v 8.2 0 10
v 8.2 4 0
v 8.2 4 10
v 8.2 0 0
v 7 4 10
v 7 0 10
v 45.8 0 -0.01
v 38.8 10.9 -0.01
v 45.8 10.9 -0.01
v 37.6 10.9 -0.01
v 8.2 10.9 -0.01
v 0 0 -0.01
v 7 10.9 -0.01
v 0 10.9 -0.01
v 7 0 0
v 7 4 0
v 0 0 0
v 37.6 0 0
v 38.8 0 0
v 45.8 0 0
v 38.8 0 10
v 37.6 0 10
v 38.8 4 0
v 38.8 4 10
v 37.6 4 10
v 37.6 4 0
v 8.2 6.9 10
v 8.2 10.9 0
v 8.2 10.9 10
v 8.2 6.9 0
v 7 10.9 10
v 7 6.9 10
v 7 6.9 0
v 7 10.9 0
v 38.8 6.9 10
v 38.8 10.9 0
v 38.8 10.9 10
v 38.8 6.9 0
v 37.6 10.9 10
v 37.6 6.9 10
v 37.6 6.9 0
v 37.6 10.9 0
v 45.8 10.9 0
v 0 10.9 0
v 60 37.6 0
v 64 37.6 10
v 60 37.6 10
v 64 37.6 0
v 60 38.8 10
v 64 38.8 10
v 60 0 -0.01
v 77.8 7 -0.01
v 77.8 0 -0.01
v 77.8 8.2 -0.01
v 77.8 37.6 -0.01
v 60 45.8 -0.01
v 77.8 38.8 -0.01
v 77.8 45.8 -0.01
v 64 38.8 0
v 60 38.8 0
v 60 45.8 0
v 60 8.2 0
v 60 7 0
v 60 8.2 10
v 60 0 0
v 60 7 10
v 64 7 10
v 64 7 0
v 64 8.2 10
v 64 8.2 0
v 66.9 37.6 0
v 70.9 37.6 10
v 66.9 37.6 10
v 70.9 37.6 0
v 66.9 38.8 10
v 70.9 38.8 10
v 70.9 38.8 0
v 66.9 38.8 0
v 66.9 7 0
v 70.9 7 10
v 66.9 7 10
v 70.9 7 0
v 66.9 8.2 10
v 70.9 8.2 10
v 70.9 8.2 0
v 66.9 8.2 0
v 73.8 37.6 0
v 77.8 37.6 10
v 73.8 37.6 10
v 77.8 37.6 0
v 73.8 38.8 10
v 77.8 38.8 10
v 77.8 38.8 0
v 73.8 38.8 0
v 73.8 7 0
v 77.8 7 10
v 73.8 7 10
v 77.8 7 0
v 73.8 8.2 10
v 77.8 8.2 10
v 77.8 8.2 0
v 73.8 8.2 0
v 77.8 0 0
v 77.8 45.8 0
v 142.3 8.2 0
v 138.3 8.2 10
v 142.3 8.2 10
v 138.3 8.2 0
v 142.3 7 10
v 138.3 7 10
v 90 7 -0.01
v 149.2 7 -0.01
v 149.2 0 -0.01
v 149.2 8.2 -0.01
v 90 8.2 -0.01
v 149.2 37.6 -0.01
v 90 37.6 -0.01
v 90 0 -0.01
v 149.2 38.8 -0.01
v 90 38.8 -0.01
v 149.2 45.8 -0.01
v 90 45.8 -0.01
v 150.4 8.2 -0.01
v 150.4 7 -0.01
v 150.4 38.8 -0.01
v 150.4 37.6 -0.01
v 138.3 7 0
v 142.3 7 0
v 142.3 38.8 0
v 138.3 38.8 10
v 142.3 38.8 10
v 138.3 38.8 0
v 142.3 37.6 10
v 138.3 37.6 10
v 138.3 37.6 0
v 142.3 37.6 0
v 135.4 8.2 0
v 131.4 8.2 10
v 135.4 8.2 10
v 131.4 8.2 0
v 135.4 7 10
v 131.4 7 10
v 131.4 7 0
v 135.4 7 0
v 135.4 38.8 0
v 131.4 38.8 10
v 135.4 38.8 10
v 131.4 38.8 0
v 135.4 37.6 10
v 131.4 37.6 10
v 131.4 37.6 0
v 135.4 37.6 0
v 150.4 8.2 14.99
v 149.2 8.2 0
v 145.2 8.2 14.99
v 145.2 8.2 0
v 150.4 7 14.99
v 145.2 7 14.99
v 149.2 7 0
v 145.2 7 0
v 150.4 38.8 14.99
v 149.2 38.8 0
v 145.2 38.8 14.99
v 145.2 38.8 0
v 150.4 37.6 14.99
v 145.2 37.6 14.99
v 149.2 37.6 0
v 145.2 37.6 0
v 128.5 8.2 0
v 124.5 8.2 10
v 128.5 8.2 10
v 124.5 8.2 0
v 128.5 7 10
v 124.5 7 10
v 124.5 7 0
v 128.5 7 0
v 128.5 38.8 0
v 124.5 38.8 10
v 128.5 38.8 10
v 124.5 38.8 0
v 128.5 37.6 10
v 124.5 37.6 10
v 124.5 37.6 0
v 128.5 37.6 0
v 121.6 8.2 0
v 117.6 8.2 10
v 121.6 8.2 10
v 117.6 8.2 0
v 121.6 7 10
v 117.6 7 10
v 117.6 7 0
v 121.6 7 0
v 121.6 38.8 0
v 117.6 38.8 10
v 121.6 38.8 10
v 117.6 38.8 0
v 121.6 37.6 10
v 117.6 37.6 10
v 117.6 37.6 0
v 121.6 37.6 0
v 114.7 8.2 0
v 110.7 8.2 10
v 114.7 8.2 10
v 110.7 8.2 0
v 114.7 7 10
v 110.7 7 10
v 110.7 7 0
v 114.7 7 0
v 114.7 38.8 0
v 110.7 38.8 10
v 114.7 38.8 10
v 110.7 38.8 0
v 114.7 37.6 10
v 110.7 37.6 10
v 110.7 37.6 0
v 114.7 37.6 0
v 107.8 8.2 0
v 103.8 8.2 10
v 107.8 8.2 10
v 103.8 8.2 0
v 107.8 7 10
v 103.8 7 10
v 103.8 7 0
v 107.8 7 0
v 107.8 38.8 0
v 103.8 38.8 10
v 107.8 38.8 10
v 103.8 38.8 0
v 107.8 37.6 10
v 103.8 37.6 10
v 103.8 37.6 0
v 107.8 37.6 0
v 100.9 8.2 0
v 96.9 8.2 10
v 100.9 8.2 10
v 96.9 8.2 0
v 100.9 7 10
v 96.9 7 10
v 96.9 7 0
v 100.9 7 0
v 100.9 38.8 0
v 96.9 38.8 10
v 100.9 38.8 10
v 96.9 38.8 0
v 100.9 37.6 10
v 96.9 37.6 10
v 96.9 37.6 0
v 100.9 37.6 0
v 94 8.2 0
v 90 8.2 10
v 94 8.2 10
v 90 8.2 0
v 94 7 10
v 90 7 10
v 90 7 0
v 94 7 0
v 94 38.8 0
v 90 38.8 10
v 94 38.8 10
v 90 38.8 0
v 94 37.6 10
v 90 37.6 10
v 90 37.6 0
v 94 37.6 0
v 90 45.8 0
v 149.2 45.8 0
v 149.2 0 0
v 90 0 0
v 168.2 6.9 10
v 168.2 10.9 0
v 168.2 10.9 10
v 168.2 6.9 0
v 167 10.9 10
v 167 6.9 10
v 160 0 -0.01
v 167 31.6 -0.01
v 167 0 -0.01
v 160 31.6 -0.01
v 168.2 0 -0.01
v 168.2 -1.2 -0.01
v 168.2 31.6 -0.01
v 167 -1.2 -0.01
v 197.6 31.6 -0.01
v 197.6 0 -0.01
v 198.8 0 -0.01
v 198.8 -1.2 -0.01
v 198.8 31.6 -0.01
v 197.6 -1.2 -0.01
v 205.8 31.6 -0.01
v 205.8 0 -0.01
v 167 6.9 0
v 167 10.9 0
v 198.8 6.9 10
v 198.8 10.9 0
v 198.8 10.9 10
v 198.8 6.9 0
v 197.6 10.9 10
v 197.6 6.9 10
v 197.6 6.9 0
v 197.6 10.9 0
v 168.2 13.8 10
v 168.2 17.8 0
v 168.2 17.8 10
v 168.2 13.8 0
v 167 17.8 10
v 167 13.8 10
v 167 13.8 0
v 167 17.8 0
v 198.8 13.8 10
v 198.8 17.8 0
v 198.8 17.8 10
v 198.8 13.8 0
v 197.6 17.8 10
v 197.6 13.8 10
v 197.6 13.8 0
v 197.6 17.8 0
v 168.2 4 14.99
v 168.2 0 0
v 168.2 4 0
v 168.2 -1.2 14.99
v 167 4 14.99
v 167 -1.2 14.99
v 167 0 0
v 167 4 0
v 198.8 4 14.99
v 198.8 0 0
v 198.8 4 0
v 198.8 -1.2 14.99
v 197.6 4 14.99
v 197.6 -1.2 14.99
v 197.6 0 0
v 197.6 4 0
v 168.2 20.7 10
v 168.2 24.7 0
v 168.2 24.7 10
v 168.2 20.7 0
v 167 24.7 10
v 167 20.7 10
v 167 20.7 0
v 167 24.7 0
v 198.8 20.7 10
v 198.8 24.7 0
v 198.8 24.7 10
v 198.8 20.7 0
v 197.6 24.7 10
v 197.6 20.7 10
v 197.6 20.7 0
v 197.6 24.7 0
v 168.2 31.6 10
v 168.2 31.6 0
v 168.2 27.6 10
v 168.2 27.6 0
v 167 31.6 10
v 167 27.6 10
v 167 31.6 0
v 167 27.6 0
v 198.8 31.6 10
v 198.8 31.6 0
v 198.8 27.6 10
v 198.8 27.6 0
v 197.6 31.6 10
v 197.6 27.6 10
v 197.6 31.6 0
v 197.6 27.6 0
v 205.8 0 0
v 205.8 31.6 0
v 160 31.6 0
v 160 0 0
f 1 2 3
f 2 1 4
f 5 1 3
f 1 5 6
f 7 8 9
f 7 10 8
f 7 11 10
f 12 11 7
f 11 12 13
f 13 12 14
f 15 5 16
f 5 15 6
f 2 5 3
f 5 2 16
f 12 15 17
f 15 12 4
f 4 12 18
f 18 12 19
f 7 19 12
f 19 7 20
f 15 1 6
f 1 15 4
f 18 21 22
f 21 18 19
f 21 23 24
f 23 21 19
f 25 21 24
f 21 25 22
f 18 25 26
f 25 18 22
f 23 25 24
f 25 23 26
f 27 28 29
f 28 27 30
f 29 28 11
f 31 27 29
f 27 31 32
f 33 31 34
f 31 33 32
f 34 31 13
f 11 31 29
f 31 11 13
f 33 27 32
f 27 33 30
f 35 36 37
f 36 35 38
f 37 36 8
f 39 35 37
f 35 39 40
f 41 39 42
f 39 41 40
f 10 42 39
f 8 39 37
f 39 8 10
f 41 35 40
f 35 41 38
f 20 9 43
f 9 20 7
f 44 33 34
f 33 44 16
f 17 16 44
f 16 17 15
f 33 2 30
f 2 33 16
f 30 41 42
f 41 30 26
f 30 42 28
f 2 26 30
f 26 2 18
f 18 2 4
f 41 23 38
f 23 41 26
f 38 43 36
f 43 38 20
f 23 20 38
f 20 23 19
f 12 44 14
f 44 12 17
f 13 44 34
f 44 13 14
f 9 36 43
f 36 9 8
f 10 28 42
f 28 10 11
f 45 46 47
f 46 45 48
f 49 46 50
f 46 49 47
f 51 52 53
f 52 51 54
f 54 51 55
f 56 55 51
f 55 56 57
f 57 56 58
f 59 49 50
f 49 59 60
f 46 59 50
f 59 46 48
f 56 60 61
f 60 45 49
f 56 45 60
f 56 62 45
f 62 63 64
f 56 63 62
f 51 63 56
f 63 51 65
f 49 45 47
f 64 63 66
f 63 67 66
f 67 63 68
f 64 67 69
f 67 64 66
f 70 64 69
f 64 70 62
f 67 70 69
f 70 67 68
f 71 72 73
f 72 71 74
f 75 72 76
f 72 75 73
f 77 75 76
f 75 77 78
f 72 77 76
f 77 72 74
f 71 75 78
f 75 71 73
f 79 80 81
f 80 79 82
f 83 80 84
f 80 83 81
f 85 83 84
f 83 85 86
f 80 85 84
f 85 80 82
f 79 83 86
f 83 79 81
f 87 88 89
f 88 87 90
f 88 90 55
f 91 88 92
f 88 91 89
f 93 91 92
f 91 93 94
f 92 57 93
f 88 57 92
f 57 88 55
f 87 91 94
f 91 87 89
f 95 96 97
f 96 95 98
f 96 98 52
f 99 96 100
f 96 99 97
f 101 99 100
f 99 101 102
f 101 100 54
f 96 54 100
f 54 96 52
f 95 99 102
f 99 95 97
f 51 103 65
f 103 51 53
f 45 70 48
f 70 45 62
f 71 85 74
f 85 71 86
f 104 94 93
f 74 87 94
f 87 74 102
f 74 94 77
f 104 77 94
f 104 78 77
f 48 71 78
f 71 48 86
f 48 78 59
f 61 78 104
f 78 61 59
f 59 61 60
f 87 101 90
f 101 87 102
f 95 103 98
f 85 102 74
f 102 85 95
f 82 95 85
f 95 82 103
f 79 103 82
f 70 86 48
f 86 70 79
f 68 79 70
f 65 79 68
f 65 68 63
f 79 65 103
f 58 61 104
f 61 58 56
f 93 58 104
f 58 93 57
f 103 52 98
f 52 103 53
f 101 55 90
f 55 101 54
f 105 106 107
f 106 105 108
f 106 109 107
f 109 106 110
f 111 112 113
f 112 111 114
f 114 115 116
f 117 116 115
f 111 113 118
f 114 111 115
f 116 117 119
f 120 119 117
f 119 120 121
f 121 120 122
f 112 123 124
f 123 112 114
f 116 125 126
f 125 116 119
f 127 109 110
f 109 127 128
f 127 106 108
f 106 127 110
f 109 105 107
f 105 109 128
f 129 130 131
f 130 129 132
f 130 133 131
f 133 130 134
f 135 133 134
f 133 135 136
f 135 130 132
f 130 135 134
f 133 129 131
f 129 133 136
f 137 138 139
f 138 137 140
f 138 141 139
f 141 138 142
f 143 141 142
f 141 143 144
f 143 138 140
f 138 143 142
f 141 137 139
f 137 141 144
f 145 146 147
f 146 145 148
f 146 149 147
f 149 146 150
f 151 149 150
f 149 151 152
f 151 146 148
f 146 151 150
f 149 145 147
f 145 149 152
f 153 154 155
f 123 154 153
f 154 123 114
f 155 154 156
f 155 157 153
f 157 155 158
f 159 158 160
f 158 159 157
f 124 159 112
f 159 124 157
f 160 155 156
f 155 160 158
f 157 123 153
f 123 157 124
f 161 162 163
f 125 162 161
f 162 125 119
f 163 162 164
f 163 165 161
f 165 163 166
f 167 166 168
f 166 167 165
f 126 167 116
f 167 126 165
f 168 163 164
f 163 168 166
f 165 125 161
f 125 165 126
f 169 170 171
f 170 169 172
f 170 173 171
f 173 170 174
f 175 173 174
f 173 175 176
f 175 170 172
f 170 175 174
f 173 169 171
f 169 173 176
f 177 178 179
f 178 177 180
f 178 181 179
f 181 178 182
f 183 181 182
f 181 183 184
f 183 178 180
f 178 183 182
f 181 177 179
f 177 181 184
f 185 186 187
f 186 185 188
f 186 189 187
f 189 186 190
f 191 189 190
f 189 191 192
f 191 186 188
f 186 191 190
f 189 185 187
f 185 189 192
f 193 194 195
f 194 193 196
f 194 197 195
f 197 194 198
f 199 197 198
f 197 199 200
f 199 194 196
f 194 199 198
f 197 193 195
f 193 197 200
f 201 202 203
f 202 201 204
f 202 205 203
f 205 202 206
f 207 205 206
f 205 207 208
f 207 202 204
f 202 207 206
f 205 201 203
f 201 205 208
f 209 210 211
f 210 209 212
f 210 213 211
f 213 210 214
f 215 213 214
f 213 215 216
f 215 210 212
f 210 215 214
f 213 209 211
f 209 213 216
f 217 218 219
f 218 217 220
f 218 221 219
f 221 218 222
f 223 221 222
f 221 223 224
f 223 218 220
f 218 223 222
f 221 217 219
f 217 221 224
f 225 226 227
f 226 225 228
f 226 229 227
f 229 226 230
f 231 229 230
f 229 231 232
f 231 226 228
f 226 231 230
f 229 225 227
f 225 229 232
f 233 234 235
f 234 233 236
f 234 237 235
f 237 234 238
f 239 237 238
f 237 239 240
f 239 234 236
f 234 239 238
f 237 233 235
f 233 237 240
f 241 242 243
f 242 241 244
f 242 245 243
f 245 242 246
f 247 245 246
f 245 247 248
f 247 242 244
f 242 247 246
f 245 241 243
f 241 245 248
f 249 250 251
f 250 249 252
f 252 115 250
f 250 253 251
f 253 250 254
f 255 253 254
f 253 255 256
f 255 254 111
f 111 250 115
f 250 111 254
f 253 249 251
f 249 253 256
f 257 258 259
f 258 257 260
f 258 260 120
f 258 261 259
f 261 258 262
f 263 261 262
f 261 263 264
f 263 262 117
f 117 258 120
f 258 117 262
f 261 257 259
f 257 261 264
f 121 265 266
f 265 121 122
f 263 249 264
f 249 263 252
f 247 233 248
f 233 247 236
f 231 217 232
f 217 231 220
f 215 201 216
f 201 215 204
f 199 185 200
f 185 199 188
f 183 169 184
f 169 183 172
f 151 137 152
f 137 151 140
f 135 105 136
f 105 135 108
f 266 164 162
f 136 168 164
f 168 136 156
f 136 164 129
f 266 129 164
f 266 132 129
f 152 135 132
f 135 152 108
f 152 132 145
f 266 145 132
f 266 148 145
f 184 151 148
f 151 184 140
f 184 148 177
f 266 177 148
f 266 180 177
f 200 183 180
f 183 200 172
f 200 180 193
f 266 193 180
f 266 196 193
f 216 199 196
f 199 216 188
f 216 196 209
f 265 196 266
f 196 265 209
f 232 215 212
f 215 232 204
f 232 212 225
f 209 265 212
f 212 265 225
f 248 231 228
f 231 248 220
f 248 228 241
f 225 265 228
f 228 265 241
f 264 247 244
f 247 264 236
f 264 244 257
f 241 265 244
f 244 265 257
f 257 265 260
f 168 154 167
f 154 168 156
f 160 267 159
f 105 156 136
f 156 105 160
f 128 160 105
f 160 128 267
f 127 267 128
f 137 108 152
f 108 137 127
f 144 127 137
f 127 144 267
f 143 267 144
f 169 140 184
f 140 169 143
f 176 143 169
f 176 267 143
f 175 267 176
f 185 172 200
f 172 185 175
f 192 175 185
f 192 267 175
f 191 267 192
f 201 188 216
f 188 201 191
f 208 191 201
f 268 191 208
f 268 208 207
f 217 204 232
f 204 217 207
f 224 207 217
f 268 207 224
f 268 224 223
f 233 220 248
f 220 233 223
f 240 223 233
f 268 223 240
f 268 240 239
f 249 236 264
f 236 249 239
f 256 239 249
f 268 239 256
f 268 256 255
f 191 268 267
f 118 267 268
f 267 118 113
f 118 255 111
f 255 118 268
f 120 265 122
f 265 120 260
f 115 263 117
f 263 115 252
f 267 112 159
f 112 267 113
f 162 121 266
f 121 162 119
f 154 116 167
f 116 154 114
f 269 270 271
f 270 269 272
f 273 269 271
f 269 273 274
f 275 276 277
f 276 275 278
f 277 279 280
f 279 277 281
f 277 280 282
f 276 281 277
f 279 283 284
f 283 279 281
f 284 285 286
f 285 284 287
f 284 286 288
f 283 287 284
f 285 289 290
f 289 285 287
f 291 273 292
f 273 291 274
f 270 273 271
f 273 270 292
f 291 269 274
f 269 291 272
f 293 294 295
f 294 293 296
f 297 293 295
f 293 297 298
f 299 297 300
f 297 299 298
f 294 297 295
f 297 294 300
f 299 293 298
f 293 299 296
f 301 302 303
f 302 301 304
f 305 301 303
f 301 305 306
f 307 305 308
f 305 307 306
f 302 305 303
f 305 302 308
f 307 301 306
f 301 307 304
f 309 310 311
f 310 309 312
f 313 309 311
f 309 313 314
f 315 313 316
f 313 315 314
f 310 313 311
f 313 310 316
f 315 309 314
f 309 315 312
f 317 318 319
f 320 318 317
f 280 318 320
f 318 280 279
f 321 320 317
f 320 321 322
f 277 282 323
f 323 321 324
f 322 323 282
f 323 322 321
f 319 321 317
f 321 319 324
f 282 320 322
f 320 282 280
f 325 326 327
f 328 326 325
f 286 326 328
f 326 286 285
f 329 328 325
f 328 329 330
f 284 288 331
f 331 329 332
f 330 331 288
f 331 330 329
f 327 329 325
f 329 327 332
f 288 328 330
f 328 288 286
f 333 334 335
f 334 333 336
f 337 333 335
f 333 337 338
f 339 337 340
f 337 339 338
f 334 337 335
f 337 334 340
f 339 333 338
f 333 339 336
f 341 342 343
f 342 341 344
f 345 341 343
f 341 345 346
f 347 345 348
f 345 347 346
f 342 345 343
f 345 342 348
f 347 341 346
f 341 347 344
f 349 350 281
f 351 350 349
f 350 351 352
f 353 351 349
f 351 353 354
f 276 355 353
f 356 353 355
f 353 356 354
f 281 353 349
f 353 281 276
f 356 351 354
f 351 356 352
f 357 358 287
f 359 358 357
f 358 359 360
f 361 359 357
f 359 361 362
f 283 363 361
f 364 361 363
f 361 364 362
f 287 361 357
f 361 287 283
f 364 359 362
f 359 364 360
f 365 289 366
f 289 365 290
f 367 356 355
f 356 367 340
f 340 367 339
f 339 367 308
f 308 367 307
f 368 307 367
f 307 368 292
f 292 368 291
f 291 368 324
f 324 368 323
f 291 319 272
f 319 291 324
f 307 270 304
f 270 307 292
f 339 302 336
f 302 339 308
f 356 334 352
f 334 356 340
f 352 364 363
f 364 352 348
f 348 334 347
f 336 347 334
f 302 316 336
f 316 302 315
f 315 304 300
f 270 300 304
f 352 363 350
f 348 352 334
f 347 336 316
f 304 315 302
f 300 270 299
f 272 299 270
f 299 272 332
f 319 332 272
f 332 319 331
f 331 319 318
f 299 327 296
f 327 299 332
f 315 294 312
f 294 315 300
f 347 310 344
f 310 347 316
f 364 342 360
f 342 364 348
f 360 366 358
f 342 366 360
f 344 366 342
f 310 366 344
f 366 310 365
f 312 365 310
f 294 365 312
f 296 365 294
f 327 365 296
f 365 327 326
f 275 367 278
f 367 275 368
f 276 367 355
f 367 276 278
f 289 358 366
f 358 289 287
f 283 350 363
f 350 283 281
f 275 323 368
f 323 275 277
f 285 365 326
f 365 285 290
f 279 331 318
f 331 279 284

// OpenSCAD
// file: ../../Base/Boxes.scad
// Fischertechnik Box Foundation
// Pre-designed Boxes

use <Constants.scad>

include <PlacementOptions.scad>

box190Width = 190;
box190Depth = 130;
box130Width = 130;
box130Depth = 95;

// Values are from an original ec3 box
topBottomDifference = 1.5;
outerHeight = 40;
innerHeight = 38.2;
baseThickness = outerHeight - innerHeight;
stackExcess = 5.7;
radius = 3.5;
wallThickness = 1.5;
tolerance = 0.2;
stackOffset = innerHeight - stackExcess;

boxUsageHeight = stackOffset;
boxWallThickness = wallThickness;
boxBaseThickness = baseThickness;
boxWebWidth = 3.0;

// getBoxWallThickness()
// Gets the wall thickness of a Fischertechnik Box
function getBoxWallThickness() = boxWallThickness;

// getBoxUsageHeight()
// Gets the usable height of a Fischertechnik box
function getBoxUsageHeight() = boxUsageHeight;

// getBoxInnerHeight()
// Gets the inner height of a Fischertechnik box, including the stack excess
function getBoxInnerHeight() = innerHeight;

// getBoxBaseThickness()
// Gets the thickness of the Fischertechnik box base.
function getBoxBaseThickness() = boxBaseThickness;

// getBoxWebWidth()
// Gets the width of a box web
function getBoxWebWidth() = boxWebWidth;

// getBox190Space()
// Gets the usable inner space of a Box 190 as an x/y-list
function getBox190Space() = [
    box190Width - 2*getBoxWallThickness() - topBottomDifference, 
    box190Depth - 2*getBoxWallThickness() - topBottomDifference ];

// BoxBase(width, depth)
// Creates an empty stackable Fischertechnik compatible box
// width = Outer width of the box (190, 130, ...)
// depth = Outer depth of the box (130, 95, ...)

module BoxBase(width, depth, height=outerHeight) {    
    thinPlate = 0.01;

    innerHeight = height - baseThickness;    
    
    module BodyPlate(width, depth) {
        translate([radius, radius])
        hull() {
            w = width-2*radius;
            d = depth-2*radius;
            cube([w, d, thinPlate]);
            cylinder(thinPlate, r=radius, $fn=getFragments());
            translate([w, 0])
                cylinder(thinPlate, r=radius, $fn=getFragments());
            translate([w, d])
                cylinder(thinPlate, r=radius, $fn=getFragments());
            translate([0, d])
                cylinder(thinPlate, r=radius, $fn=getFragments());
        }
    }
    
    module Body(tolerance=tolerance) {
        hull() {
            // Bottom with tolerance to fit into the original boxes when stacked
            translate([-wallThickness+tolerance, -wallThickness+tolerance, -baseThickness])
                BodyPlate(width-topBottomDifference-2*tolerance, depth-topBottomDifference-2*tolerance);
            
            // Top
            translate([-wallThickness-topBottomDifference/2, -wallThickness-topBottomDifference/2, innerHeight-thinPlate])
                BodyPlate(width, depth);
         }
    }

    module Cutoff() {
        hull() {
            coWidth = width - 2*wallThickness;
            coDepth = depth - 2*wallThickness;
            
            // Bottom
            BodyPlate(coWidth-topBottomDifference, coDepth-topBottomDifference);

            // Top
            translate([-topBottomDifference/2, -topBottomDifference/2, innerHeight+thinPlate]) 
                BodyPlate(coWidth, coDepth);
        }
    }
    
    difference() {        
        Body();
        Cutoff();
        stackOffset = innerHeight - stackExcess;
        translate([0, 0, stackOffset + baseThickness])
            Body(tolerance=0);
    }
}

// Creates the Fischertechnik empty box 130x190 mm and places it at position 0,0
// 190x130 are the outer sizes, the inner space is slightly smaller. Use getBox190Space() to get the inner sizes.
// The box is positioned that the usable inner space is at the 0,0,0 position. The

module Box190() {
    BoxBase(box190Width, box190Depth);
}

// Gets the usable inner space of a Box 130 as an x/y-list
function getBox130Space() = [
    box130Width - 2*getBoxWallThickness(), 
    box130Depth - 2*getBoxWallThickness() ];

// Creates the Fischertechnik empty box 95x130 mm and places it at position 0,0
// 190x130 are the outer sizes, the inner space is slightly smaller. Use getBox190Space() to get the inner sizes.
// The box is positioned that the usable inner space is at the 0,0,0 position. The

module Box130() {
    BoxBase(box130Width, box130Depth);
}

// Creates a web at the specified box walls
// corner 0 = LowerLeft, 1 = UpperLeft, 2 = UpperRight, 3 = LowerRight
// side 0 = LeftOfCorner, 1 = RightOfCorner
// distance = Distance in mm from the corner
// boxSpace = inner width and depth of the box (default: Box 190)
// webWidth = length of the web (default is 3 mms)
// webThickness = thickness of the web (default is 1 mm)

module BoxWeb(corner, side, distance, boxSpace=getBox190Space(), webWidth=getBoxWebWidth(), webThickness=1.0) {
    sink = getBoxWallThickness()/2;

    width = (corner % 2 == 0) ? 
            (side == LeftOfCorner ? webWidth : webThickness) :
            (side == LeftOfCorner ? webThickness : webWidth);

    depth = (corner % 2 == 0) ? 
            (side == RightOfCorner ? webWidth : webThickness) :
            (side == RightOfCorner ? webThickness : webWidth);
    
    xDiff = corner == LowerLeft ? 
                (side == LeftOfCorner ? -sink : distance) :
            (corner == UpperLeft ?                
                (side == LeftOfCorner ? distance : -sink) :
            (corner == UpperRight ?
                (side == LeftOfCorner ? boxSpace.x-webWidth+sink : boxSpace.x-distance-webThickness) :
                (side == LeftOfCorner ? boxSpace.x-distance-webThickness: boxSpace.x-webWidth+sink)));

    yDiff = corner == LowerLeft ? 
                (side == RightOfCorner ? -sink : distance) :
            (corner == UpperLeft ?
                (side == RightOfCorner ? boxSpace.y-distance : boxSpace.y-webWidth+sink) :
            (corner == UpperRight ?
                (side == RightOfCorner ? boxSpace.y-webWidth+sink : boxSpace.y-distance) :
                (side == RightOfCorner ? distance : -sink)));
    
    translate([xDiff, yDiff, -getExcess()])
        cube([width, depth, boxUsageHeight + 2*getExcess()]);
}
// file: ../../Base/Rotation.scad
// Fischertechnik Box Foundation
// Geometry Helpers Rotation

include <PlacementOptions.scad>

// getRotatedSpace(space, rotation=NoRotation)
// Rotates the space dependent on the specified rotation

function getRotatedSpace(space, rotation=NoRotation) = [
    (rotation == Rotate90 || rotation == Rotate270) ? space.y : space.x,
    (rotation == Rotate90 || rotation == Rotate270) ? space.x : space.y
];

// Rotates the given space around the fixed left lower corner
// space = the space the children needs as width/depth list [width,depth]
// rotation = 0 Rotate0 degrees, 1 Rotate90 degrees, 2 Rotate180 degrees, 3 Rotate270 degrees (equivalent to -90)

module RotateFix(space, rotation=NoRotation) {
    dy = (rotation == Rotate0 || rotation == Rotate270) ? 0 :
        (rotation == Rotate90) ? space.x :
        space.y;
    dx = (rotation < Rotate180) ? 0 :
        (rotation == Rotate180) ? space.x :
        space.y;
    
    translate([dx, dy, 0])
        rotate([0, 0, rotations[rotation]])
            children();
}
// file: ../../Base/Alignment.scad
// Fischertechnik Box Foundation
// Geometry Helpers Alignment

include <PlacementOptions.scad>

// getAlignedX(elementWidth, spaceWidth, align=AlignRight, offset=0)
// Gets the aligned X offset of an element with the given
// width in the given space.
// elementWidth = The width of the element to positon
// spaceWidth = The space where the element should be aligned
// align = 0 AlignLeft, 1 AlignCenter, 2 AlignRight
// offset = an optional offset from the aligned position. When
// aligned left or centered, then positive values are in X direction.
// When aligned right then positive values are in negative X direction.

function getAlignedX(elementWidth, spaceWidth, align=AlignRight, offset=0) =
    (align == AlignLeft) ?
        offset :
        ((align == AlignCenter) ?
        (spaceWidth - elementWidth)/2 + offset :
        spaceWidth - offset - elementWidth);

// getAlignedY(elementDepth, spaceDepth, align=AlignTop, offset=0)
// Gets the aligned Y offset of an element with the given
// depth in the given space.
// elementDepth = The depth of the element to positon
// spaceDepth = The space where the element should be aligned
// align = 0 AlignBottom, 1 AlignCenter, 2 AlignTop
// offset = an optional offset from the aligned position. When
// aligned bottom or centered, then positive values are in Y direction.
// When aligned top then positive values are in negative Y direction.

function getAlignedY(elementDepth, spaceDepth, align=AlignTop, offset=0) =
    (align == AlignBottom) ?
        offset :
        ((align == AlignCenter) ?
        (spaceDepth - elementDepth)/2 + offset :
        spaceDepth - offset - elementDepth);
// file: ../../Base/Constants.scad
// Fischertechnik Box Foundation
// Constants

// Constant values necessary for multiple elements

// Base constants
dividerThickness = 1.2;
excess = 0.01;
fragments = 90;
tolerance = 0.8;

// Gets the thickness of a divider 
function getDividerThickness() = dividerThickness;

// Gets the excess that is used to merge walls into each other
function getExcess() = excess;

// Gets amount of fragments of a cylinder
function getFragments() = fragments;

// Gets the inner tolerance of a frame to each side
function getTolerance() = tolerance;


// Fischertechnik specific constants
axisDiameter = 4;
axisBottomDiameter = axisDiameter + 1;
standardEdgeDistance = 2.5;
standardWebDistance = 11.5;
standardCornerLength = 15;
tubeWallFactor = 0.8;
smallPartsFrameHeight = 20;

// Gets axis diameter
function getAxisDiameter() = axisDiameter;

// Gets axis bottom diameter for thicker part at the bottom
function getAxisBottomDiameter() = axisBottomDiameter;

// gets the standard distance to the wall of the box for dockable frames with webs
function getStandardEdgeDistance() = standardEdgeDistance;

// gets the standard distance of each web to the corner of the dockable frame
function getStandardWebDistance() = standardWebDistance;

// gets the standard length of the corner walls of a dockable frame
function getStandardCornerLength() = standardCornerLength;

// gets the wall thickness of a tube.
function getTubeWallThickness() = tubeWallFactor * getDividerThickness();

// gets the frame height for docked small parts boxes.
function getSmallPartsFrameHeight() = smallPartsFrameHeight;
// file: ../../Base/PlacementOptions.scad
// Fischertechnik Box Foundation
// Placement Options

// Alignment
NoAlign = 0;
AlignLeft = 1;
AlignBottom = 2;
AlignCenter = 3;
AlignRight = 4;
AlignTop = 5;

// Element rotation degree steps
rotations = [0, -90, -180, -270];

// Rotation
NoRotation = 0;
Rotate0 = 0;
Rotate90 = 1;
Rotate180 = 2;
Rotate270 = 3;

// Docking (seen from above)
NoDock = -1;
DockLeft = 0;
DockTop = 1;
DockRight = 2;
DockCorner = 2;
DockBottom = 3;

// Web corners
LowerLeft = 0;
UpperLeft = 1;
UpperRight = 2;
LowerRight = 3;

// Web position relative to corner
LeftOfCorner = 0;
RightOfCorner = 1;
// file: ../../Elements/HolderBuildingPlate30x45.scad
// Fischertechnik Box Library
// Holder for Building Plate 30x45
// 38259

use <../ModelBase/Complex.scad>

width = 45;

// getHolderBuildingPlate30x45Space(count = 1)
// Gets the width (.x) and depth (.y) space the holder needs.

function getHolderBuildingPlate30x45Space(count = 1) = getHolderBuildingPlateSpace(width, count);

// HolderBuildingPlate30x45(count=1, dock=false)
// Holder for building plates 45x30
// count = Count of building plates (default 1)
// dock = true if the holders are docked to the box wall (default false) 

module HolderBuildingPlate30x45(count = 1, dock = false) {
    HolderBuildingPlate(width, count, dock);
}

// Test
color("lightgray")
HolderBuildingPlate30x45();
// file: ../../Base/Placement.scad
// Fischertechnik Box Foundation
// Geometry Helpers Placement

use <Constants.scad>
use <Alignment.scad>
use <Rotation.scad>
use <Boxes.scad>

include <PlacementOptions.scad>

// Place(x=0, y=0, elementSpace=[0,0], alignX=AlignLeft, alignY=AlignBottom, rotation=Rotate0, boxSpace=getBox190Space())
// Places the child at the specified position
// y = Y-Position. This is a relative position when an X aligment is specified.
// x = X-Position. This is a relative position when an Y aligment is specified.
// elementSpace = space of the element to be placed [x,y]
// alignX = -1=NoAlign, 0 AlignLeft, 1 AlignCenter, 3 AlignRight (elementSpace and boxSpace required!)
// alignY = -1=NoAlign, 2 AlignBottom, 1 AlignCenter, 4 AlignTop (elementSpace and boxSpace required!)
// rotation = 0 Rotate0 0 degrees, 1 Rotate90 90 degrees, 
// 2 Rotate180 180 degrees, 3 Rotate270 270 degrees (equivalent to -90)
// boxSpace = Inner space of the box where the placement occurs [x,y] - default is Box 190x130 inner space

module Place(x=0, y=0, elementSpace=[0,0], 
  alignX=AlignLeft, alignY=AlignBottom, 
  rotation=NoRotation, boxSpace=getBox190Space()) {

    module Position(x, y, space, rotation=Rotate0) {
        translate([x, y, 0])
            RotateFix(space, rotation)
                children();
    }

    space = getRotatedSpace(elementSpace, rotation);
    alignedX = getAlignedX(space.x, boxSpace.x, alignX, x);
    alignedY = getAlignedY(space.y, boxSpace.y, alignY, y);
    Position(alignedX, alignedY, elementSpace, rotation)
        children();
}

// Center(space=getBox130Space(), elementSpace=[0,0])
// space = Space where the children is centered. For cylinder use centered=true and no elementSpace.
// elementSpace = space of the element to be centered [x,y]

module Center(space=getBox190Space(), elementSpace=[0,0]) {
    Place(elementSpace=elementSpace, boxSpace=space, alignX=AlignCenter, alignY=AlignCenter)
        children();
}

// CenterHorizontal(width=0, y=0, offset=0, space=getBox130Space())
// width = Width of the element to be placed.
// y = Y position of the element
// offset = Offset from the center position (negative will be left of the center)
// space = Space where the element is placed

module CenterHorizontal(width=0, y=0, offset=0, space=getBox190Space()) {
    Place(x=offset, y=y, elementSpace=[width, 0], boxSpace=space, alignX=AlignCenter)
        children(0);
}

// CenterVertical(depth=0, x=0, offset=0, space=getBox130Space())
// depth = Depth of the element to be placed.
// x = X position of the element
// offset = Offset from the center position (negative will be down of the center)
// space = Space where the element is placed

module CenterVertical(depth=0, x=0, offset=0, space=getBox190Space()) {
    Place(x=x, y=offset, elementSpace=[0, depth], boxSpace=space, alignY=AlignCenter)
        children(0);
}

// getIsVertical(align)
// True if the specified alignment needs a vertical orientation for a divider (AlignRight, AlignLeft)

function getIsVertical(align) = (align == AlignRight || align == AlignLeft);

// getIsHorizontal(align)
// True if the specified alignment needs a horizontal orientation for a divider (AlignTop, AlignBottom)

function getIsHorizontal(align) = (align == AlignTop || align == AlignBottom);
// main file
// Fischertechnik Box Foundation
// Elements
// Test HolderBuildingPlate30x45

use <../../Base/Placement.scad>
use <../../Elements/HolderBuildingPlate30x45.scad>

include <../../Base/PlacementOptions.scad>

HolderBuildingPlate30x45();

Place(60, 0, elementSpace=getHolderBuildingPlate30x45Space(2), rotation=Rotate90)
    HolderBuildingPlate30x45(2);

Place(90, 0, elementSpace=getHolderBuildingPlate30x45Space(8), rotation=Rotate270)
    HolderBuildingPlate30x45(8, true);

Place(160, 0)
    HolderBuildingPlate30x45(4, true);
